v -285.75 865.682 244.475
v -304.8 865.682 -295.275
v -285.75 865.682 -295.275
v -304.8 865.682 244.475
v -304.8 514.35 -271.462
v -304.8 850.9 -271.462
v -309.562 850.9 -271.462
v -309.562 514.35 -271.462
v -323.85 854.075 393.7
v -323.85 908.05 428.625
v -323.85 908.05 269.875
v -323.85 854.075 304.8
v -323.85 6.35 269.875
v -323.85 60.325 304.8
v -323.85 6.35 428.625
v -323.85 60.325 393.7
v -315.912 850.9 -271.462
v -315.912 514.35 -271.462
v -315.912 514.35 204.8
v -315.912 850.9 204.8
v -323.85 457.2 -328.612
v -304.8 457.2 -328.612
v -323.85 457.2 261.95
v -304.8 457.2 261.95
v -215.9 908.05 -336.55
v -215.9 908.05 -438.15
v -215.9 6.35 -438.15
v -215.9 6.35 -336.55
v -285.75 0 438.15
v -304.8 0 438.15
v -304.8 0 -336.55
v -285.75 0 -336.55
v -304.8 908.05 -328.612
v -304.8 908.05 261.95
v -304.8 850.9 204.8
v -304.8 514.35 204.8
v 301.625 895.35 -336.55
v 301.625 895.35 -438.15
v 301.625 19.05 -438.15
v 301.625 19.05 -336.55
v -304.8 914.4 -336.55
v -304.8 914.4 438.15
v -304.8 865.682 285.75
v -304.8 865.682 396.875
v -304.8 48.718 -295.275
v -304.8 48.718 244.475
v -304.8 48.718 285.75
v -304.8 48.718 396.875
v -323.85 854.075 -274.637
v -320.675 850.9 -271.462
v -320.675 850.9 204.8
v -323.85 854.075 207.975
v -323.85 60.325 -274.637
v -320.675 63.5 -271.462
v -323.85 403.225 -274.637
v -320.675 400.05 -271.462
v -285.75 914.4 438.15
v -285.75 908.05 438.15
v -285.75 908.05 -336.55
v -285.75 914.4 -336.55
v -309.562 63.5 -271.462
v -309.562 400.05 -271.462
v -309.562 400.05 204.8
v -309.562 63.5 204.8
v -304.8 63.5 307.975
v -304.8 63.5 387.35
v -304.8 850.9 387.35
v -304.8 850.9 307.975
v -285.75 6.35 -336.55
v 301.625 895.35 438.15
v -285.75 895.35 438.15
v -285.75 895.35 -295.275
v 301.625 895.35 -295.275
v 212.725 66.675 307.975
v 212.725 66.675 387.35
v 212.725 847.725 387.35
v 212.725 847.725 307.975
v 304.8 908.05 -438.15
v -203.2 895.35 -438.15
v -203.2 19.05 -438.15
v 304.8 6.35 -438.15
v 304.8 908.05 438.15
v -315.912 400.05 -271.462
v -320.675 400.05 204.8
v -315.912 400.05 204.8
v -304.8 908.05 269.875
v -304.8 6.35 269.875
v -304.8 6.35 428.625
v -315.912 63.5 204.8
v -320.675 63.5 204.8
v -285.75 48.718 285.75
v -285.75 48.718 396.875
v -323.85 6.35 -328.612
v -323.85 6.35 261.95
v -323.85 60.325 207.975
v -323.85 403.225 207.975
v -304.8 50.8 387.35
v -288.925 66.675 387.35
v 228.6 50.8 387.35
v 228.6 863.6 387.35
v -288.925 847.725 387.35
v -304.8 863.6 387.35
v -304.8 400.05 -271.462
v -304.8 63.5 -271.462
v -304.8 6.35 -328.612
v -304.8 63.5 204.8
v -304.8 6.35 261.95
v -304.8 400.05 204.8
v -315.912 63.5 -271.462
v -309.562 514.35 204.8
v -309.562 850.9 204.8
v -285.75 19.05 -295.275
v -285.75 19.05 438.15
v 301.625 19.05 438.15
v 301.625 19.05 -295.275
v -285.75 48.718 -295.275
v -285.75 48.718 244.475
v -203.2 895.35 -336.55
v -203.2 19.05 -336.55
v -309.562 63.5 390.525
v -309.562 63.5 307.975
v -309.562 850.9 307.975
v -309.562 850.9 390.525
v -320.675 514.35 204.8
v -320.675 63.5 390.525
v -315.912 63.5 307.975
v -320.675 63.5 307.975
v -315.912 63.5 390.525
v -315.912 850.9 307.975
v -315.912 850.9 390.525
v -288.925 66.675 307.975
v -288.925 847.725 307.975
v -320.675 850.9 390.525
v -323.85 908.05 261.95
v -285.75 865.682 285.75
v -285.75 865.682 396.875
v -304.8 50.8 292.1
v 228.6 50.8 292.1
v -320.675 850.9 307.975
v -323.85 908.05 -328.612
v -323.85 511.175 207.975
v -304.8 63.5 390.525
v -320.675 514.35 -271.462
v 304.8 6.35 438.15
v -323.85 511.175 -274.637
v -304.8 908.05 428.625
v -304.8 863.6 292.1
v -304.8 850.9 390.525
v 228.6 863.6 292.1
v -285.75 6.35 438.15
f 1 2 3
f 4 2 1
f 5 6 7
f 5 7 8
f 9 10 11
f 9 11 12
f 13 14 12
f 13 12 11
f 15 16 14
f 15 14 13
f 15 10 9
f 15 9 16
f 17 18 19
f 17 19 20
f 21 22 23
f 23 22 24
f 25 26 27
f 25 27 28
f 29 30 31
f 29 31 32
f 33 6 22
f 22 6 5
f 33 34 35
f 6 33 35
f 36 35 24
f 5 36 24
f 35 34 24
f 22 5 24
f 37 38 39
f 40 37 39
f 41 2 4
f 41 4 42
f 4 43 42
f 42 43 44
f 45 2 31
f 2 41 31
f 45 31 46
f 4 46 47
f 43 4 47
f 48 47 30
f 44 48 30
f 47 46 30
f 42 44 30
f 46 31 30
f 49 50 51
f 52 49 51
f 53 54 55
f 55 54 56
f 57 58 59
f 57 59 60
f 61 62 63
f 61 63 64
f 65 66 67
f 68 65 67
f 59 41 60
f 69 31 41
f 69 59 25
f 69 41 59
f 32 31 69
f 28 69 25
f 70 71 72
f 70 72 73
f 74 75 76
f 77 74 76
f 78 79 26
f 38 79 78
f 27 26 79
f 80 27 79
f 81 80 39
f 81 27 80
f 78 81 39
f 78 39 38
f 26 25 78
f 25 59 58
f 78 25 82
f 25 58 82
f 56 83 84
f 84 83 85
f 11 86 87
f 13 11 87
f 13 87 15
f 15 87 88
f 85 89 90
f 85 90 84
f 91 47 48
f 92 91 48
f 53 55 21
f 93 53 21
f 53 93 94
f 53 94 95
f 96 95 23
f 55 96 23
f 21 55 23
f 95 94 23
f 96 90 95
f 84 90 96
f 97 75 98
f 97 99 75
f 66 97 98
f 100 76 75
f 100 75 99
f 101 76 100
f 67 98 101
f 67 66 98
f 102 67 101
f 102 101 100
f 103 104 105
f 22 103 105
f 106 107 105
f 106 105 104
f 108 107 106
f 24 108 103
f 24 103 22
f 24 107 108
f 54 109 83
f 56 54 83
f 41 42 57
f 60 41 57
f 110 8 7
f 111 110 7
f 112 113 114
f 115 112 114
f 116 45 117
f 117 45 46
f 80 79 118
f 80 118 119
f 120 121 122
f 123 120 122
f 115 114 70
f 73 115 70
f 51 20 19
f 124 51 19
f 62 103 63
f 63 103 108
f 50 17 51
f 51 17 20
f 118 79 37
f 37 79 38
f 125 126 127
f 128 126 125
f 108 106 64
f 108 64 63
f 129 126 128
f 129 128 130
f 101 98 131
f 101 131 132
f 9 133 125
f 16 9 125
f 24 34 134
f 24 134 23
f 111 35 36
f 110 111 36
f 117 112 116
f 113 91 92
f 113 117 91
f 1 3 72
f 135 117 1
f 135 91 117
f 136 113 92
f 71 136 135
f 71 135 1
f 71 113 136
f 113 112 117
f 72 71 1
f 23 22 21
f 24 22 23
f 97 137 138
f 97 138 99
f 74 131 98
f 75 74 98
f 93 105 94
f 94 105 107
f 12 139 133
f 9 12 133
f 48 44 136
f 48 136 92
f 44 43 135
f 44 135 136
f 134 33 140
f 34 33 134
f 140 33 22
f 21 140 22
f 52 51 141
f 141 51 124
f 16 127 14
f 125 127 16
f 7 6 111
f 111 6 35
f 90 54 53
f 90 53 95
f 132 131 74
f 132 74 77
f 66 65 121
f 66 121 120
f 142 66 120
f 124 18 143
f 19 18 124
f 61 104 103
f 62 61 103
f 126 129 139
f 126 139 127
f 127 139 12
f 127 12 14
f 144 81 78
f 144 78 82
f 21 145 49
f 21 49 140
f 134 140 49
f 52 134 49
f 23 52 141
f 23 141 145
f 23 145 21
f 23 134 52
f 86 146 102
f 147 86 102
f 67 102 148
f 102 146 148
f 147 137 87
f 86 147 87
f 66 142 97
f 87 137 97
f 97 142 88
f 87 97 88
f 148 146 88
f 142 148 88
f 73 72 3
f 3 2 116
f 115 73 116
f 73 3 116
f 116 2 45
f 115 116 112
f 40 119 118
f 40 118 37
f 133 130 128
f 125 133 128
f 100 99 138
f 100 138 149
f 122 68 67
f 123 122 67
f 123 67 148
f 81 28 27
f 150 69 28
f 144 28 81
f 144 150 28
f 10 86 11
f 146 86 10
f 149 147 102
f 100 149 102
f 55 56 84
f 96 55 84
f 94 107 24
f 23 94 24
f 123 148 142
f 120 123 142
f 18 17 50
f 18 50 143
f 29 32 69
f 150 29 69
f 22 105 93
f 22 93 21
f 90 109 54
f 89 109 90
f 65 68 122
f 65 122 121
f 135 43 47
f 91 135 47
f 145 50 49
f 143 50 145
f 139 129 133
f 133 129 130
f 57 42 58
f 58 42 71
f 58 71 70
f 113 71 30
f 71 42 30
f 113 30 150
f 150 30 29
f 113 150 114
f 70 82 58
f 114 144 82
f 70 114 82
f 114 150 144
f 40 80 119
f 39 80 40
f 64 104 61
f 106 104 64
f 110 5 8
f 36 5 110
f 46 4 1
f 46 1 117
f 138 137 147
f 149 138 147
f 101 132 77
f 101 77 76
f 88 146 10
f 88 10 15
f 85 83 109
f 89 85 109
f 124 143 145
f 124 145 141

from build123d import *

# Parameters (mm, degrees)
F0_W          = 609.6
F0_H          = 876.3
F1_DEPTH      = 914.4
F2_W          = 88.9
F2_H          = 101.6
F3_DEPTH      = 914.401
F4_W          = 816.9639344262
F4_H          = 692.15
F5_DEPTH      = 19.05
F6_W          = 590.55
F6_H          = 6.35
F7_DEPTH      = 876.301
F8_W          = 587.375
F8_H          = 876.3
F9_DEPTH      = 733.425
F10_W         = 816.9639344262
F10_H         = 41.275
F11_DEPTH     = 19.05
F12_W         = 450.85
F12_H         = 590.5627
F12_W_2       = 336.55
F12_H_2       = 476.2627
F13_DEPTH     = 19.05
F14_W         = 6.35
F14_H         = 336.55
F15_DEPTH     = 476.2627
F16_SIZE      = 3.175
F17_W         = 901.7
F17_H         = 158.75
F17_W_2       = 787.4
F17_H_2       = 82.55
F18_DEPTH     = 19.05
F19_W         = 6.35
F19_H         = 787.4
F20_DEPTH     = 82.55
F21_SIZE      = 3.175
F22_W         = 504.825
F22_H         = 876.3
F23_DEPTH     = 101.6
F24_W         = 812.8
F24_H         = 95.25
F25_DEPTH     = 533.4
F26_T         = 15.875
F26_T3_DEPTH  = 37.249261314
F26_T5_DEPTH  = 37.249261314
F26_T7_DEPTH  = 37.249261314
F26_T9_DEPTH  = 37.249261314
F26_T11_DEPTH = 36.5125
F26_T13_DEPTH = 819.15
F26_T15_DEPTH = 114.3
F26_T17_DEPTH = 127
F26_T19_DEPTH = 844.55
F26_T21_DEPTH = 111.125
F26_T23_DEPTH = 36.5125


# Not quite as in the source:
# - a shell that OpenCascade refuses in one call is made with other operations: the cavity is built on its own and cut out


with BuildPart() as f1:
    # F0 (on Front) → F1 (new body)
    with BuildSketch(Plane.XZ):
        Rectangle(F0_W, F0_H)
    extrude(amount=-F1_DEPTH)

    # F2 (on face) → F3 (cut, through all)
    with BuildSketch(Plane.XZ):
        with Locations((-260.35, -387.35)):
            Rectangle(F2_W, F2_H)
    extrude(amount=-F3_DEPTH, mode=Mode.SUBTRACT)

    # F4 (on face) → F5 (cut)
    with BuildSketch(Plane(origin=(-304.8, 0, 0), x_dir=(0, -1, 0), z_dir=(-1, 0, 0))):
        with Locations((-457.2, 50.8)):
            Rectangle(F4_W, F4_H)
    extrude(amount=-F5_DEPTH, mode=Mode.SUBTRACT)

    # F6 (on face) → F7 (cut, through all)
    with BuildSketch(Plane.XY.offset(438.15)):
        with Locations((9.525, 911.225)):
            Rectangle(F6_W, F6_H)
        with Locations((9.525, 3.175)):
            Rectangle(F6_W, F6_H)
    extrude(amount=-F7_DEPTH, mode=Mode.SUBTRACT)

    # F8 (on face) → F9 (cut, through all)
    with BuildSketch(Plane.XY.offset(438.15)):
        with Locations((7.9375, 457.2)):
            Rectangle(F8_W, F8_H)
    extrude(amount=-F9_DEPTH, mode=Mode.SUBTRACT)

    # F10 (on face) → F11 (join, through all)
    with BuildSketch(Plane(origin=(-304.8, 0, 0), x_dir=(0, -1, 0), z_dir=(-1, 0, 0))):
        with Locations((-457.2, 265.1125)):
            Rectangle(F10_W, F10_H)
    extrude(amount=-F11_DEPTH)

    # F22 (on face) → F23 (cut)
    with BuildSketch(Plane(origin=(0, 0, -438.15), x_dir=(1, 0, 0), z_dir=(0, 0, -1))):
        with Locations((49.2125, -457.2)):
            Rectangle(F22_W, F22_H)
    extrude(amount=-F23_DEPTH, mode=Mode.SUBTRACT)


with BuildPart() as f13:
    # F12 (on face) → F13 (new body)
    with BuildSketch(Plane(origin=(-304.8, 0, 0), x_dir=(0, -1, 0), z_dir=(-1, 0, 0))):
        with Locations((-682.625, -33.33115)):
            Rectangle(F12_W, F12_H)
        with Locations((-682.625, -33.33115)):
            Rectangle(F12_W_2, F12_H_2, mode=Mode.SUBTRACT)
    extrude(amount=F13_DEPTH)

    # F14 (on face) → F15 (join, through all)
    with BuildSketch(Plane.XY.offset(-271.4625)):
        with Locations((-312.7375, 682.625)):
            Rectangle(F14_W, F14_H)
    extrude(amount=F15_DEPTH)

    # F16
    f16_edges = [f13.edges().sort_by_distance(p)[0] for p in [
        (-323.85, 850.9, -33.33115),
        (-323.85, 682.625, -271.4625),
        (-323.85, 514.35, -33.33115),
        (-323.85, 682.625, 204.8002),
    ]]
    chamfer(f16_edges, length=F16_SIZE)


with BuildPart() as f18:
    # F17 (on face) → F18 (new body)
    with BuildSketch(Plane(origin=(-304.8, 0, 0), x_dir=(0, -1, 0), z_dir=(-1, 0, 0))):
        with Locations((-457.2, 349.25)):
            Rectangle(F17_W, F17_H)
        with Locations((-457.2, 349.25)):
            Rectangle(F17_W_2, F17_H_2, mode=Mode.SUBTRACT)
    extrude(amount=F18_DEPTH)

    # F19 (on face) → F20 (join, through all)
    with BuildSketch(Plane.XY.offset(307.975)):
        with Locations((-312.7375, 457.2)):
            Rectangle(F19_W, F19_H)
    extrude(amount=F20_DEPTH)

    # F21
    f21_edges = [f18.edges().sort_by_distance(p)[0] for p in [
        (-323.85, 457.2, 307.975),
        (-323.85, 850.9, 349.25),
        (-323.85, 457.2, 390.525),
        (-323.85, 63.5, 349.25),
    ]]
    chamfer(f21_edges, length=F21_SIZE)

    # F24 (on face) → F25 (join)
    with BuildSketch(Plane.YZ.offset(-304.8)):
        with Locations((457.2, 339.725)):
            Rectangle(F24_W, F24_H)
    extrude(amount=F25_DEPTH)

    # F26: shell of thickness 15.875, made by hand


with BuildPart() as f26_core1:
    # F26_t2: copy of F18
    add(f18.part)

    # the walls: a layer under each face that stays
    f26_faces = [f26_core1.faces().sort_by_distance(p)[0] for p in [
        (-323.85, 757.7666666667, 296.3333333333),
        (-322.2625, 457.2, 306.3875),
        (-322.2625, 61.9125, 349.25),
        (-322.2625, 852.4875, 349.25),
        (-322.2625, 457.2, 392.1125),
        (-314.325, 457.2, 428.625),
        (-314.325, 908.05, 349.25),
        (-314.325, 457.2, 269.875),
        (-314.325, 6.35, 349.25),
        (-318.29375, 457.2, 307.975),
        (-318.29375, 63.5, 349.25),
        (-318.29375, 850.9, 349.25),
        (-318.29375, 457.2, 390.525),
        (-304.8, 757.7666666667, 402.1666666667),
        (-315.9125, 457.2, 349.25),
        (-38.1, 863.6, 339.725),
        (-38.1, 457.2, 292.1),
        (-38.1, 50.8, 339.725),
        (-307.18125, 63.5, 349.25),
        (-307.18125, 457.2, 390.525),
        (-307.18125, 850.9, 349.25),
        (-304.8, 457.2, 347.6625),
        (228.6, 457.2, 339.725),
        (-307.18125, 457.2, 307.975),
        (-309.5625, 457.2, 349.25),
    ]]
    thicken(f26_faces, amount=-F26_T, mode=Mode.SUBTRACT)

    # F26_s4 → F26_t3 (cut)
    with BuildSketch(Plane(origin=(4.5928978099, 4.5928978099, 4.5928978099), x_dir=(-0.7071067812, 0.7071067812, 0), z_dir=(0.5773502692, 0.5773502692, 0.5773502692))):
        Polygon((271.8908726623, 356.5892701441), (263.7152476623, 342.7036353262), (255.7777476623, 347.2863530879), (255.7777476623, 356.4517886113), align=None)
    extrude(amount=F26_T3_DEPTH, mode=Mode.SUBTRACT)

    # F26_s6 → F26_t5 (cut)
    with BuildSketch(Plane(origin=(-300.2071021901, 300.20710219, -300.2071021901), x_dir=(0.7071067812, 0.7071067812, 0), z_dir=(0.5773502692, -0.5773502692, 0.5773502692))):
        Polygon((374.6875680546, 729.8915069443), (382.8631930546, 716.0058721263), (390.8006930546, 720.588589888), (390.8006930546, 729.7540254114), align=None)
    extrude(amount=F26_T5_DEPTH, mode=Mode.SUBTRACT)

    # F26_s8 → F26_t7 (cut)
    with BuildSketch(Plane(origin=(-228.2404355234, -228.2404355234, 228.2404355234), x_dir=(-0.7071067812, 0.7071067812, 0), z_dir=(0.5773502692, 0.5773502692, -0.5773502692))):
        Polygon((271.8908726623, 213.7335916339), (255.7777476623, 213.8710731668), (255.7777476623, 223.0365086901), (263.7152476623, 227.6192264518), align=None)
    extrude(amount=F26_T7_DEPTH, mode=Mode.SUBTRACT)

    # F26_s10 → F26_t9 (cut)
    with BuildSketch(Plane(origin=(-533.0404355234, 533.0404355234, 533.0404355234), x_dir=(0.7071067812, 0.7071067812, 0), z_dir=(0.5773502692, -0.5773502692, -0.5773502692))):
        Polygon((374.6875680546, -159.5686451663), (390.8006930546, -159.4311636334), (390.8006930546, -150.26572811), (382.8631930546, -145.6830103483), align=None)
    extrude(amount=F26_T9_DEPTH, mode=Mode.SUBTRACT)

    # F26_s12 → F26_t11 (cut)
    with BuildSketch(Plane.YZ.offset(-336.55)):
        Polygon((850.74125, 308.13375), (850.9, 292.1), (866.775, 292.1), (866.775, 307.975), align=None)
        Polygon((63.65875, 308.13375), (63.5, 292.1), (47.625, 292.1), (47.625, 307.975), align=None)
        Polygon((63.65875, 390.36625), (47.625, 390.525), (47.625, 406.4), (63.5, 406.4), align=None)
        Polygon((850.74125, 390.36625), (866.775, 390.525), (866.775, 406.4), (850.9, 406.4), align=None)
    extrude(amount=F26_T11_DEPTH, mode=Mode.SUBTRACT)

    # F26_s14 → F26_t13 (cut)
    with BuildSketch(Plane.XZ.offset(-866.775)):
        Polygon((-316.07125, 308.13375), (-315.9125, 292.1), (-300.0375, 292.1), (-300.0375, 307.975), align=None)
        Polygon((-316.07125, 390.36625), (-315.9125, 406.4), (-300.0375, 406.4), (-300.0375, 390.525), align=None)
        Polygon((-309.40375, 390.36625), (-309.5625, 406.4), (-325.4375, 406.4), (-325.4375, 390.525), align=None)
        Polygon((-304.95875, 308.13375), (-288.925, 307.975), (-288.925, 292.1), (-304.8, 292.1), align=None)
        Polygon((-309.40375, 308.13375), (-309.5625, 292.1), (-325.4375, 292.1), (-325.4375, 307.975), align=None)
    extrude(amount=F26_T13_DEPTH, mode=Mode.SUBTRACT)

    # F26_s16 → F26_t15 (cut)
    with BuildSketch(Plane.XY.offset(292.1)):
        Polygon((-316.07125, 63.65875), (-315.9125, 47.625), (-300.0375, 47.625), (-300.0375, 63.5), align=None)
        Polygon((-316.07125, 850.74125), (-315.9125, 866.775), (-300.0375, 866.775), (-300.0375, 850.9), align=None)
        Polygon((-309.40375, 63.65875), (-309.5625, 47.625), (-325.4375, 47.625), (-325.4375, 63.5), align=None)
        Polygon((-309.40375, 850.74125), (-309.5625, 866.775), (-325.4375, 866.775), (-325.4375, 850.9), align=None)
    extrude(amount=F26_T15_DEPTH, mode=Mode.SUBTRACT)

    # F26_s18 → F26_t17 (cut)
    with BuildSketch(Plane.XY.offset(276.225)):
        Polygon((-304.64125, 863.75875), (-320.675, 863.6), (-320.675, 847.725), (-304.8, 847.725), align=None)
        Polygon((-304.64125, 50.64125), (-320.675, 50.8), (-320.675, 66.675), (-304.8, 66.675), align=None)
    extrude(amount=F26_T17_DEPTH, mode=Mode.SUBTRACT)

    # F26_s20 → F26_t19 (cut)
    with BuildSketch(Plane.XZ.offset(-879.475)):
        Polygon((-304.64125, 291.94125), (-320.675, 292.1), (-320.675, 307.975), (-304.8, 307.975), align=None)
    extrude(amount=F26_T19_DEPTH, mode=Mode.SUBTRACT)

    # F26_s22 → F26_t21 (cut)
    with BuildSketch(Plane.XY.offset(292.1)):
        Polygon((-304.95875, 63.65875), (-304.8, 47.625), (-288.925, 47.625), (-288.925, 63.5), align=None)
        Polygon((-304.95875, 850.74125), (-304.8, 866.775), (-288.925, 866.775), (-288.925, 850.9), align=None)
    extrude(amount=F26_T21_DEPTH, mode=Mode.SUBTRACT)

    # F26_s24 → F26_t23 (cut)
    with BuildSketch(Plane.YZ.offset(-325.4375)):
        Polygon((63.65875, 308.13375), (47.625, 307.975), (47.625, 292.1), (63.5, 292.1), align=None)
        Polygon((63.65875, 390.36625), (47.625, 390.525), (47.625, 406.4), (63.5, 406.4), align=None)
        Polygon((850.74125, 390.36625), (850.9, 406.4), (866.775, 406.4), (866.775, 390.525), align=None)
        Polygon((850.74125, 308.13375), (866.775, 307.975), (866.775, 292.1), (850.9, 292.1), align=None)
    extrude(amount=F26_T23_DEPTH, mode=Mode.SUBTRACT)


with BuildPart() as f18_1:
    add(f18.part)

    # what is left inside the walls is the cavity
    f26_cavity = [f26_core1.part.solids().sort_by_distance(p)[0] for p in [
        (45.508333, 457.2, 308.13375),
    ]]
    add(f26_cavity, mode=Mode.SUBTRACT)


with BuildPart() as f27_1:
    # F27: instance of F13
    add(f13.part.mirror(Plane(origin=(-314.325, 457.2, -33.33115), x_dir=(1, 0, 0), z_dir=(0, -1, 0))))


solid = Compound([f1.part, f13.part, f18_1.part, f27_1.part])
